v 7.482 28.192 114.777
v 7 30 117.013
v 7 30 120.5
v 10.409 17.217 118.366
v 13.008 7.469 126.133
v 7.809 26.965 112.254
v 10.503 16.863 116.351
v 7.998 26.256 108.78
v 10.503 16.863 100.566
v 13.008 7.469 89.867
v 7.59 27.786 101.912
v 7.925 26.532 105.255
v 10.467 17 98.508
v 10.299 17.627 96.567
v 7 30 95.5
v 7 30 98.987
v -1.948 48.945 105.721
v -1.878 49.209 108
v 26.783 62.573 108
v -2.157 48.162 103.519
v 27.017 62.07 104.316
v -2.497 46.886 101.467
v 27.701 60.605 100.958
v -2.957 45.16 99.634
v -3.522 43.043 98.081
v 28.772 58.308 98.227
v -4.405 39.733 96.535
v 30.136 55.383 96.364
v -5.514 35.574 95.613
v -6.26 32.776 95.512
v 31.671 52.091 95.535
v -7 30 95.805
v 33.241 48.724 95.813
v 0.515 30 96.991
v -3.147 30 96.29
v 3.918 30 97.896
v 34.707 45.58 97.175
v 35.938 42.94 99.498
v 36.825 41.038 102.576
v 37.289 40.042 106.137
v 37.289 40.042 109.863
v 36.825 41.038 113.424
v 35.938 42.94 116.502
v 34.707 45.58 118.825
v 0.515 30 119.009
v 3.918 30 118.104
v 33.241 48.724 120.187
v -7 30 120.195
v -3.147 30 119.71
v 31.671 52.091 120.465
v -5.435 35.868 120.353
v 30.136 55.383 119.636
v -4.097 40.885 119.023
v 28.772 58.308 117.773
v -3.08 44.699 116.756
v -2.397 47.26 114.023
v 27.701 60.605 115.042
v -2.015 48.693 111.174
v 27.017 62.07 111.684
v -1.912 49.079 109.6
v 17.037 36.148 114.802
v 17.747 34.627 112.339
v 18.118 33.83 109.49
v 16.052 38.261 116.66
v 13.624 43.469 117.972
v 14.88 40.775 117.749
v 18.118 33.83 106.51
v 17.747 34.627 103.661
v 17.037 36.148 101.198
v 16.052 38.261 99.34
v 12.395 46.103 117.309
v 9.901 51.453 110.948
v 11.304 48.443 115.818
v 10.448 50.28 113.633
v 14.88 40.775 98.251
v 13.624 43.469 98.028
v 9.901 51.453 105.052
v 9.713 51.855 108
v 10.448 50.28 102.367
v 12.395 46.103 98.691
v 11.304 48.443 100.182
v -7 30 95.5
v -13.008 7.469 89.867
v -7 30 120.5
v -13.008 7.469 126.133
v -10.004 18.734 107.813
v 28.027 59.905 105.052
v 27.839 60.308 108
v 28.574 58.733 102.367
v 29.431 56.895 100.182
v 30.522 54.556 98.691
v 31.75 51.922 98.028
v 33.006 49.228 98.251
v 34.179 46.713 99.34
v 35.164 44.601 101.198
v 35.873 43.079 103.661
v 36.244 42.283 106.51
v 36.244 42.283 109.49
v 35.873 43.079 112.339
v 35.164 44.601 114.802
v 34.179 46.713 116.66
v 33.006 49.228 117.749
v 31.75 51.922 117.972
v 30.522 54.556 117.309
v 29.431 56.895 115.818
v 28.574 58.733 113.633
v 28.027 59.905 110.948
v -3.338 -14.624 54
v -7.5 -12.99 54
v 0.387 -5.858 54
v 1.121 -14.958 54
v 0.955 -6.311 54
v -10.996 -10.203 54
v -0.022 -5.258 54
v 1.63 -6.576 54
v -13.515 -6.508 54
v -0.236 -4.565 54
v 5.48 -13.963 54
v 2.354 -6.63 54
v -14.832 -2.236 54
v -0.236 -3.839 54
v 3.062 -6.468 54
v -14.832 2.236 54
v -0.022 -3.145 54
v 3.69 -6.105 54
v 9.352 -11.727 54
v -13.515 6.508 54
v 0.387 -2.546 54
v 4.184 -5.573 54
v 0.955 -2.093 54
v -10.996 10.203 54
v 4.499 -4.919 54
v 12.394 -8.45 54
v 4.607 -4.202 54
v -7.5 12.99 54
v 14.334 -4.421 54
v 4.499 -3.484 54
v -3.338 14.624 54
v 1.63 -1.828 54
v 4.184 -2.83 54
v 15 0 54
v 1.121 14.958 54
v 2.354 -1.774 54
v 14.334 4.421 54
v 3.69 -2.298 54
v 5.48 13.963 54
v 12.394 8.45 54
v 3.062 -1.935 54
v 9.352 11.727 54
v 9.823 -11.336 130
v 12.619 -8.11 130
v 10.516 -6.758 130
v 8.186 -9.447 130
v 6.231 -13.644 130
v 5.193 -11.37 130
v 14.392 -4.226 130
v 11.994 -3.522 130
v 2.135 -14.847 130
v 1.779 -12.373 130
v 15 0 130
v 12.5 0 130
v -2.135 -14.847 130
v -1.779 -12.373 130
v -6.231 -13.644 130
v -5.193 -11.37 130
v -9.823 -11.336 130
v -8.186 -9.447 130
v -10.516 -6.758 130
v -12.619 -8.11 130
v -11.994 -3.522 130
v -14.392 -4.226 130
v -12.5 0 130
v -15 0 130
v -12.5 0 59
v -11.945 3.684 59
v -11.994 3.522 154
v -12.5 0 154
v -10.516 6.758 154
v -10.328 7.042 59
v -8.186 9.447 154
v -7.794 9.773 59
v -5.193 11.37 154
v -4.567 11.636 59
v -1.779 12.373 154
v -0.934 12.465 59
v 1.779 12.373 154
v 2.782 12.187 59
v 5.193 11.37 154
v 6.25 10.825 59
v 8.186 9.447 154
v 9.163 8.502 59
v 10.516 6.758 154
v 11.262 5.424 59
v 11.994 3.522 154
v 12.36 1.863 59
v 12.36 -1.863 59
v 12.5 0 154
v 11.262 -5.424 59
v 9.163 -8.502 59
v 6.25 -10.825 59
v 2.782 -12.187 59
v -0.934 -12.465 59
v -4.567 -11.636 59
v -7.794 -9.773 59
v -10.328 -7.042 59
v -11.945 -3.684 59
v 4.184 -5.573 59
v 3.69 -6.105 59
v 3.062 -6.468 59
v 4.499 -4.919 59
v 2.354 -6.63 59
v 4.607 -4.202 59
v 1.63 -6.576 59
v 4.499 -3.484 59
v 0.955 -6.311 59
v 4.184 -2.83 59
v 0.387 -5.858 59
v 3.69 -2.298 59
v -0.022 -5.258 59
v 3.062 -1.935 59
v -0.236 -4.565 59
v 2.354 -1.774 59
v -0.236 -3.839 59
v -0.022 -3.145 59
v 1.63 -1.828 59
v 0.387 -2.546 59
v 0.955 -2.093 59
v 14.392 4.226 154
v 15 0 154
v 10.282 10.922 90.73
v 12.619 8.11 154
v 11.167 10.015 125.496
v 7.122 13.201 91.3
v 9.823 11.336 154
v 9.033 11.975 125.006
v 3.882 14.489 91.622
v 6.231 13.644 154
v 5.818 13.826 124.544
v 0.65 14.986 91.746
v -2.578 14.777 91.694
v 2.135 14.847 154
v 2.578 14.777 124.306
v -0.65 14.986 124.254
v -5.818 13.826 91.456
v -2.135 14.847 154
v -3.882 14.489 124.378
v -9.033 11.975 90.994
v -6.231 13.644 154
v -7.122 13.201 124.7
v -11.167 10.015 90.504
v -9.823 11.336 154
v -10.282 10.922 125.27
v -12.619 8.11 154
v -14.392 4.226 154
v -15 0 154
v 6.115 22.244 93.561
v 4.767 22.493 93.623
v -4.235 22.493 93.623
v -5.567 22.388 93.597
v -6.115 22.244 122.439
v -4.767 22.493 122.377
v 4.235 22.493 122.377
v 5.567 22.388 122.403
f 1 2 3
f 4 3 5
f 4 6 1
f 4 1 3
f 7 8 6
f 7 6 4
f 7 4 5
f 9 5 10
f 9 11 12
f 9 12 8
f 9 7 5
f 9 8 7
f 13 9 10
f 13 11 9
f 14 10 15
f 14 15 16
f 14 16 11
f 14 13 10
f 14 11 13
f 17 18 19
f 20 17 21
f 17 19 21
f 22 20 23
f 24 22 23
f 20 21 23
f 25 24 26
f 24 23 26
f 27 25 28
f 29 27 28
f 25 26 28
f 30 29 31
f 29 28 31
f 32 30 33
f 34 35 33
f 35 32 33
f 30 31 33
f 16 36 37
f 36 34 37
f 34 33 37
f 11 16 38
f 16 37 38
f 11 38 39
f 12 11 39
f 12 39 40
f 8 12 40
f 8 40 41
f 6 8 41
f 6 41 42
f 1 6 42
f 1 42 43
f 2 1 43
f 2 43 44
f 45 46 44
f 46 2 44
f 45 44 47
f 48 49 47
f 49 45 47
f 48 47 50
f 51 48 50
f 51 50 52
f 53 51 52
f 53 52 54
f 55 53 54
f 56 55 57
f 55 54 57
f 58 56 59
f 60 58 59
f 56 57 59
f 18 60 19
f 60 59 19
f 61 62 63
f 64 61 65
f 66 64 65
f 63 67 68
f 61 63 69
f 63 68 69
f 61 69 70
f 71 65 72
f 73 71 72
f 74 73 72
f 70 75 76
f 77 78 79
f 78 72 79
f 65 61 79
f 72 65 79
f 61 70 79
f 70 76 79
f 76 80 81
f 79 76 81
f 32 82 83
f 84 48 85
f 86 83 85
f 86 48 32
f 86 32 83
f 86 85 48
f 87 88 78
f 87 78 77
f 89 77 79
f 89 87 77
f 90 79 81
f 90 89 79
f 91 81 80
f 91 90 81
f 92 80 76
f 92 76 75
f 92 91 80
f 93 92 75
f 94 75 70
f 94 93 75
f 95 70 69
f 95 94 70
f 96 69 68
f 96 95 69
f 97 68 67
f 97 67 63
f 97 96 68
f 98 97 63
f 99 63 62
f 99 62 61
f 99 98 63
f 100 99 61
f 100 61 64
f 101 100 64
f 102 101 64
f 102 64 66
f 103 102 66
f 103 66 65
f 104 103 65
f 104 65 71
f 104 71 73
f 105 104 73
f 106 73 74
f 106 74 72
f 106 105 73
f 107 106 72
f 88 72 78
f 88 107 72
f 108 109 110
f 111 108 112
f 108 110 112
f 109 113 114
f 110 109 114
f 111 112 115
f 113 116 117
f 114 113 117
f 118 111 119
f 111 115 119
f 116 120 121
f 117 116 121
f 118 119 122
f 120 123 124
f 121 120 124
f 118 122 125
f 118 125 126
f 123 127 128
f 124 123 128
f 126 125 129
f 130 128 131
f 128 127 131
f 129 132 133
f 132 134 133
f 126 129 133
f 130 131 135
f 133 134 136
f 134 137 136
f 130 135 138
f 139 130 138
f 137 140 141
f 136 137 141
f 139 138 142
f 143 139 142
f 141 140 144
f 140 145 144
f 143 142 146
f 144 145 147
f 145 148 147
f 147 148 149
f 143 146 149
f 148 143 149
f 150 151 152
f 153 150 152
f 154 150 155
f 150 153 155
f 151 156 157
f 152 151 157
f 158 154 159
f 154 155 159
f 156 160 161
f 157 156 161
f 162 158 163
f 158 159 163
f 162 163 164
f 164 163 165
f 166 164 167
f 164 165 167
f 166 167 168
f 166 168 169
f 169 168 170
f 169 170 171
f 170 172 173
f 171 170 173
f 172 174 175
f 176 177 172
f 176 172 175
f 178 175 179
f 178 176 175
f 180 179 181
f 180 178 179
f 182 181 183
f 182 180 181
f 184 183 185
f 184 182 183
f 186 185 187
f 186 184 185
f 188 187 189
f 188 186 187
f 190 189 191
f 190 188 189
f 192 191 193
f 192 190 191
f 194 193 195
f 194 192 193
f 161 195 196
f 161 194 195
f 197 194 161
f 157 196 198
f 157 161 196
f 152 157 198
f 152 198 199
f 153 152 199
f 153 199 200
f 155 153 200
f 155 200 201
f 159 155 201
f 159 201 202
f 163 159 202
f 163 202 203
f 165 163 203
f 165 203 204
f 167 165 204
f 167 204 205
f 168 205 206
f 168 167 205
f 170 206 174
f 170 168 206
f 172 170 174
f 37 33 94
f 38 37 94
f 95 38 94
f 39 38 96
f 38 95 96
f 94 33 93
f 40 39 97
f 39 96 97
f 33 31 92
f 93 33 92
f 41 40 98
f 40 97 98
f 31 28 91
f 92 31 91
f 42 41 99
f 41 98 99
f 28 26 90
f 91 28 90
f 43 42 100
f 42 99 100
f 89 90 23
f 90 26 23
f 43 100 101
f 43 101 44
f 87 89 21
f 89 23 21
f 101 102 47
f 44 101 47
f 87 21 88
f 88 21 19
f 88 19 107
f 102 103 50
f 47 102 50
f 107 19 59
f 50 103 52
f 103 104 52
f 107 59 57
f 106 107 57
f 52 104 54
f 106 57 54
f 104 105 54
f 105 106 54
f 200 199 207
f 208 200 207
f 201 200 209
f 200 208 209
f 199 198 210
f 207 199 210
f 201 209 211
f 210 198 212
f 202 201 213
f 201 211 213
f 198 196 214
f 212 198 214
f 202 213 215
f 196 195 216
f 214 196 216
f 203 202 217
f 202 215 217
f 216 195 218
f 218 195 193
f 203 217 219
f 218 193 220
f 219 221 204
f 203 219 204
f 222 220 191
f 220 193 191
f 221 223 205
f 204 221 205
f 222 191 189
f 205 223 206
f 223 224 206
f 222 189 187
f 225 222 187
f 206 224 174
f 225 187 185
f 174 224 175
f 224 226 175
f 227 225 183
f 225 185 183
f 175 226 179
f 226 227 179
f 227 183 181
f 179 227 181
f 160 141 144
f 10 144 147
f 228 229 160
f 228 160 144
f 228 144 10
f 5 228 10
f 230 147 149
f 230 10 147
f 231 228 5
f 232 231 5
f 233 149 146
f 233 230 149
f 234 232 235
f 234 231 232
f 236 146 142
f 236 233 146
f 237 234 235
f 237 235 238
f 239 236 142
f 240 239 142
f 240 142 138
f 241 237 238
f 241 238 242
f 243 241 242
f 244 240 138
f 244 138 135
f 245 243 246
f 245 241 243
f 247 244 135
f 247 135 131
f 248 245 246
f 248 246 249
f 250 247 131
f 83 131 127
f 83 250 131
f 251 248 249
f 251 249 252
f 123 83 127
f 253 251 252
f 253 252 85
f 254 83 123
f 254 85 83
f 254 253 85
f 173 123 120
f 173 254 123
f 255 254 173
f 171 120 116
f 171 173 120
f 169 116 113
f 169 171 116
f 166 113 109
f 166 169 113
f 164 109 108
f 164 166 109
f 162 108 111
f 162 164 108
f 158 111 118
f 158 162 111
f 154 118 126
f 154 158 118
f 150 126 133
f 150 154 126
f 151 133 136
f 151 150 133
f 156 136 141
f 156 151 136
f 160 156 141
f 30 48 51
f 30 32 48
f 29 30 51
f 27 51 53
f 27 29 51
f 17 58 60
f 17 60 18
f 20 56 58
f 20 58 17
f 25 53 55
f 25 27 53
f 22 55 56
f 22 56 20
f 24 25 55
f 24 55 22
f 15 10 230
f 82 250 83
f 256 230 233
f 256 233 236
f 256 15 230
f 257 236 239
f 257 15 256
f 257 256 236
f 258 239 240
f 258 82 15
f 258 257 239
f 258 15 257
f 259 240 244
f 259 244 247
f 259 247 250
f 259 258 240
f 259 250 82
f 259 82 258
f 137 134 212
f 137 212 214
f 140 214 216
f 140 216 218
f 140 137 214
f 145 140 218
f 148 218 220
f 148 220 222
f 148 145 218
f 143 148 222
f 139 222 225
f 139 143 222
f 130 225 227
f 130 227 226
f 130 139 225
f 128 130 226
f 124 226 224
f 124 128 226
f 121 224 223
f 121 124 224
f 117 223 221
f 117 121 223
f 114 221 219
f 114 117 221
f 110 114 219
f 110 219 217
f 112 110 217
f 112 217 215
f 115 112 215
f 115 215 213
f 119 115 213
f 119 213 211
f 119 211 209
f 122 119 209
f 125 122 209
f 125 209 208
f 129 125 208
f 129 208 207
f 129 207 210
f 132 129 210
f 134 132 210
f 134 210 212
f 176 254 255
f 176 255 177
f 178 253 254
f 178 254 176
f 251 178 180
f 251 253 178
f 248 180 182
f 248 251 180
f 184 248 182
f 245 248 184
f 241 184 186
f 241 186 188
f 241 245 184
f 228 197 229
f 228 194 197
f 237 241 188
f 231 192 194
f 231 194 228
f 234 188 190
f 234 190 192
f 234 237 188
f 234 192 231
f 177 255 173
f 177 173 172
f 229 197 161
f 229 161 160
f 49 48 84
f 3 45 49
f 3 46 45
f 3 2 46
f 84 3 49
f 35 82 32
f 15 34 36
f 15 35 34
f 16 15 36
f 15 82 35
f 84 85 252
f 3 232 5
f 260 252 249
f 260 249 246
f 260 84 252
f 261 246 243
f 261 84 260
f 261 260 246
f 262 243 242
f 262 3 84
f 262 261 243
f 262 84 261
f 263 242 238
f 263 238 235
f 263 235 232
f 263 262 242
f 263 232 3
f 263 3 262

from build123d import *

# Parameters (mm, degrees)
BOSS_EXTRUDE1_DEPTH      = 54
BOSS_EXTRUDE1_DEPTH_BACK = 46
SKETCH1_R                = 15
BOSS_EXTRUDE3_REACH      = 99.568
SKETCH20_R               = 12.5
SKETCH20_R_2             = 10
SKETCH20_3_R             = 10
CUT_EXTRUDE2_DEPTH       = 20
SKETCH22_R               = 12.5
CUT_EXTRUDE3_DEPTH       = 95
CUT_EXTRUDE6_DEPTH       = 24
CUT_EXTRUDE7_REACH       = 125.735
SKETCH23_R               = 2.435


with BuildPart() as part:
    # Sketch1 → Boss-Extrude1 (new, two sides: drawn at the far end of the back side and taken through both)
    with BuildSketch(Plane.XY.offset(-BOSS_EXTRUDE1_DEPTH_BACK)):
        Circle(SKETCH1_R)
    extrude(amount=BOSS_EXTRUDE1_DEPTH + BOSS_EXTRUDE1_DEPTH_BACK)

    # Loft1: read off the stored shape, not the designer's step
    # Loft1: loft between two sections, ruled curve by curve
    loft1_from = [
        Edge.make_line((-13.008298755, 7.468879668, 18.132780083), (-13.008298755, 7.468879668, -18.132780083)),
        Edge.make_line((-13.008298755, 7.468879668, -18.132780083), (13.008298755, 7.468879668, -18.132780083)),
        Edge.make_line((13.008298755, 7.468879668, 18.132780083), (-13.008298755, 7.468879668, 18.132780083)),
        Edge.make_line((13.008298755, 7.468879668, -18.132780083), (13.008298755, 7.468879668, 18.132780083)),
    ]
    loft1_to = [
        Edge.make_line((-7, 30, 12.5), (-7, 30, -12.5)),
        Edge.make_line((-7, 30, -12.5), (7, 30, -12.5)),
        Edge.make_line((7, 30, 12.5), (-7, 30, 12.5)),
        Edge.make_line((7, 30, -12.5), (7, 30, 12.5)),
    ]
    loft1 = Solid(Shell([*[Face.make_surface_from_curves(loft1_from[k], loft1_to[k]) for k in range(4)], Face(Wire(loft1_from)), Face(Wire(loft1_to))]))
    add(loft1)

    # Boss-Extrude3: up to this plane
    boss_extrude3_end = Plane(origin=(-14.004149378, 3.734439834, 0), z_dir=(0.9662349396012463, -0.25766265056033255, 0))
    # Sketch20 → Boss-Extrude3 (add, up to the surface)
    with BuildSketch(Plane(origin=(32.065513698, 51.244565683, 0), x_dir=(0, 0, -1), z_dir=(0.9063077870366495, 0.4226182617407006, 0)), mode=Mode.PRIVATE) as boss_extrude3_sk1:
        with Locations(Location((0, 0, 0), (0, 0, 90))):
            Circle(SKETCH20_R)
        Circle(SKETCH20_R_2, mode=Mode.SUBTRACT)
    boss_extrude3_tool1 = split(extrude(boss_extrude3_sk1.sketch, amount=-BOSS_EXTRUDE3_REACH, mode=Mode.PRIVATE), bisect_by=boss_extrude3_end, keep=Keep.BOTH, mode=Mode.PRIVATE)
    add(boss_extrude3_tool1.solids().sort_by_distance((37.198824, 40.236147, 0))[0])
    # Sketch20 → Boss-Extrude3 (add, up to the surface)
    with BuildSketch(Plane(origin=(32.065513698, 51.244565683, 0), x_dir=(0, 0, -1), z_dir=(0.9063077870366495, 0.4226182617407006, 0)), mode=Mode.PRIVATE) as boss_extrude3_sk2:
        Circle(SKETCH20_R_2)
    boss_extrude3_tool2 = split(extrude(boss_extrude3_sk2.sketch, amount=-BOSS_EXTRUDE3_REACH, mode=Mode.PRIVATE), bisect_by=boss_extrude3_end, keep=Keep.BOTH, mode=Mode.PRIVATE)
    add(boss_extrude3_tool2.solids().sort_by_distance((32.065514, 51.244566, 0))[0])

    # Sketch20<3> → Cut-Extrude2 (cut)
    with BuildSketch(Plane(origin=(32.065513698, 51.244565683, 0), x_dir=(0, 0, -1), z_dir=(0.9063077870366495, 0.4226182617407006, 0))):
        with Locations(Location((0, 0, 0), (0, 0, 90))):
            Circle(SKETCH20_3_R)
    extrude(amount=-CUT_EXTRUDE2_DEPTH, mode=Mode.SUBTRACT)

    # Sketch22 → Cut-Extrude3 (cut)
    with BuildSketch(Plane(origin=(0, 0, -46), x_dir=(-1, 0, 0), z_dir=(0, 0, -1))):
        Circle(SKETCH22_R)
    extrude(amount=-CUT_EXTRUDE3_DEPTH, mode=Mode.SUBTRACT)

    # Sketch22<3> → Cut-Extrude6 (cut)
    with BuildSketch(Plane(origin=(0, 0, -46), x_dir=(-1, 0, 0), z_dir=(0, 0, -1))):
        with BuildLine():
            ThreePointArc((12.5, 0), (0, -12.5), (-12.5, 0))
            Line((-12.5, 0), (-15, 0))
            ThreePointArc((-15, 0), (0, -15), (15, 0))
            Line((15, 0), (12.5, 0))
        make_face()
    extrude(amount=-CUT_EXTRUDE6_DEPTH, mode=Mode.SUBTRACT)

    # Sketch23 → Cut-Extrude7 (cut, up to next)
    with BuildSketch(Plane.XY.offset(54), mode=Mode.PRIVATE) as cut_extrude7_sk1:
        with Locations((2.172182, -4.201728854)):
            Circle(SKETCH23_R)
    cut_extrude7_tool1 = extrude(cut_extrude7_sk1.sketch, amount=-CUT_EXTRUDE7_REACH, mode=Mode.PRIVATE) & part.part
    add(cut_extrude7_tool1.solids().sort_by_distance((2.172182, -4.201729, 54))[0], mode=Mode.SUBTRACT)


with BuildPart() as body_2:
    # Mirror1: mirrored copy
    add(part.part.mirror(Plane.XY.offset(54)))


solid = body_2.part
